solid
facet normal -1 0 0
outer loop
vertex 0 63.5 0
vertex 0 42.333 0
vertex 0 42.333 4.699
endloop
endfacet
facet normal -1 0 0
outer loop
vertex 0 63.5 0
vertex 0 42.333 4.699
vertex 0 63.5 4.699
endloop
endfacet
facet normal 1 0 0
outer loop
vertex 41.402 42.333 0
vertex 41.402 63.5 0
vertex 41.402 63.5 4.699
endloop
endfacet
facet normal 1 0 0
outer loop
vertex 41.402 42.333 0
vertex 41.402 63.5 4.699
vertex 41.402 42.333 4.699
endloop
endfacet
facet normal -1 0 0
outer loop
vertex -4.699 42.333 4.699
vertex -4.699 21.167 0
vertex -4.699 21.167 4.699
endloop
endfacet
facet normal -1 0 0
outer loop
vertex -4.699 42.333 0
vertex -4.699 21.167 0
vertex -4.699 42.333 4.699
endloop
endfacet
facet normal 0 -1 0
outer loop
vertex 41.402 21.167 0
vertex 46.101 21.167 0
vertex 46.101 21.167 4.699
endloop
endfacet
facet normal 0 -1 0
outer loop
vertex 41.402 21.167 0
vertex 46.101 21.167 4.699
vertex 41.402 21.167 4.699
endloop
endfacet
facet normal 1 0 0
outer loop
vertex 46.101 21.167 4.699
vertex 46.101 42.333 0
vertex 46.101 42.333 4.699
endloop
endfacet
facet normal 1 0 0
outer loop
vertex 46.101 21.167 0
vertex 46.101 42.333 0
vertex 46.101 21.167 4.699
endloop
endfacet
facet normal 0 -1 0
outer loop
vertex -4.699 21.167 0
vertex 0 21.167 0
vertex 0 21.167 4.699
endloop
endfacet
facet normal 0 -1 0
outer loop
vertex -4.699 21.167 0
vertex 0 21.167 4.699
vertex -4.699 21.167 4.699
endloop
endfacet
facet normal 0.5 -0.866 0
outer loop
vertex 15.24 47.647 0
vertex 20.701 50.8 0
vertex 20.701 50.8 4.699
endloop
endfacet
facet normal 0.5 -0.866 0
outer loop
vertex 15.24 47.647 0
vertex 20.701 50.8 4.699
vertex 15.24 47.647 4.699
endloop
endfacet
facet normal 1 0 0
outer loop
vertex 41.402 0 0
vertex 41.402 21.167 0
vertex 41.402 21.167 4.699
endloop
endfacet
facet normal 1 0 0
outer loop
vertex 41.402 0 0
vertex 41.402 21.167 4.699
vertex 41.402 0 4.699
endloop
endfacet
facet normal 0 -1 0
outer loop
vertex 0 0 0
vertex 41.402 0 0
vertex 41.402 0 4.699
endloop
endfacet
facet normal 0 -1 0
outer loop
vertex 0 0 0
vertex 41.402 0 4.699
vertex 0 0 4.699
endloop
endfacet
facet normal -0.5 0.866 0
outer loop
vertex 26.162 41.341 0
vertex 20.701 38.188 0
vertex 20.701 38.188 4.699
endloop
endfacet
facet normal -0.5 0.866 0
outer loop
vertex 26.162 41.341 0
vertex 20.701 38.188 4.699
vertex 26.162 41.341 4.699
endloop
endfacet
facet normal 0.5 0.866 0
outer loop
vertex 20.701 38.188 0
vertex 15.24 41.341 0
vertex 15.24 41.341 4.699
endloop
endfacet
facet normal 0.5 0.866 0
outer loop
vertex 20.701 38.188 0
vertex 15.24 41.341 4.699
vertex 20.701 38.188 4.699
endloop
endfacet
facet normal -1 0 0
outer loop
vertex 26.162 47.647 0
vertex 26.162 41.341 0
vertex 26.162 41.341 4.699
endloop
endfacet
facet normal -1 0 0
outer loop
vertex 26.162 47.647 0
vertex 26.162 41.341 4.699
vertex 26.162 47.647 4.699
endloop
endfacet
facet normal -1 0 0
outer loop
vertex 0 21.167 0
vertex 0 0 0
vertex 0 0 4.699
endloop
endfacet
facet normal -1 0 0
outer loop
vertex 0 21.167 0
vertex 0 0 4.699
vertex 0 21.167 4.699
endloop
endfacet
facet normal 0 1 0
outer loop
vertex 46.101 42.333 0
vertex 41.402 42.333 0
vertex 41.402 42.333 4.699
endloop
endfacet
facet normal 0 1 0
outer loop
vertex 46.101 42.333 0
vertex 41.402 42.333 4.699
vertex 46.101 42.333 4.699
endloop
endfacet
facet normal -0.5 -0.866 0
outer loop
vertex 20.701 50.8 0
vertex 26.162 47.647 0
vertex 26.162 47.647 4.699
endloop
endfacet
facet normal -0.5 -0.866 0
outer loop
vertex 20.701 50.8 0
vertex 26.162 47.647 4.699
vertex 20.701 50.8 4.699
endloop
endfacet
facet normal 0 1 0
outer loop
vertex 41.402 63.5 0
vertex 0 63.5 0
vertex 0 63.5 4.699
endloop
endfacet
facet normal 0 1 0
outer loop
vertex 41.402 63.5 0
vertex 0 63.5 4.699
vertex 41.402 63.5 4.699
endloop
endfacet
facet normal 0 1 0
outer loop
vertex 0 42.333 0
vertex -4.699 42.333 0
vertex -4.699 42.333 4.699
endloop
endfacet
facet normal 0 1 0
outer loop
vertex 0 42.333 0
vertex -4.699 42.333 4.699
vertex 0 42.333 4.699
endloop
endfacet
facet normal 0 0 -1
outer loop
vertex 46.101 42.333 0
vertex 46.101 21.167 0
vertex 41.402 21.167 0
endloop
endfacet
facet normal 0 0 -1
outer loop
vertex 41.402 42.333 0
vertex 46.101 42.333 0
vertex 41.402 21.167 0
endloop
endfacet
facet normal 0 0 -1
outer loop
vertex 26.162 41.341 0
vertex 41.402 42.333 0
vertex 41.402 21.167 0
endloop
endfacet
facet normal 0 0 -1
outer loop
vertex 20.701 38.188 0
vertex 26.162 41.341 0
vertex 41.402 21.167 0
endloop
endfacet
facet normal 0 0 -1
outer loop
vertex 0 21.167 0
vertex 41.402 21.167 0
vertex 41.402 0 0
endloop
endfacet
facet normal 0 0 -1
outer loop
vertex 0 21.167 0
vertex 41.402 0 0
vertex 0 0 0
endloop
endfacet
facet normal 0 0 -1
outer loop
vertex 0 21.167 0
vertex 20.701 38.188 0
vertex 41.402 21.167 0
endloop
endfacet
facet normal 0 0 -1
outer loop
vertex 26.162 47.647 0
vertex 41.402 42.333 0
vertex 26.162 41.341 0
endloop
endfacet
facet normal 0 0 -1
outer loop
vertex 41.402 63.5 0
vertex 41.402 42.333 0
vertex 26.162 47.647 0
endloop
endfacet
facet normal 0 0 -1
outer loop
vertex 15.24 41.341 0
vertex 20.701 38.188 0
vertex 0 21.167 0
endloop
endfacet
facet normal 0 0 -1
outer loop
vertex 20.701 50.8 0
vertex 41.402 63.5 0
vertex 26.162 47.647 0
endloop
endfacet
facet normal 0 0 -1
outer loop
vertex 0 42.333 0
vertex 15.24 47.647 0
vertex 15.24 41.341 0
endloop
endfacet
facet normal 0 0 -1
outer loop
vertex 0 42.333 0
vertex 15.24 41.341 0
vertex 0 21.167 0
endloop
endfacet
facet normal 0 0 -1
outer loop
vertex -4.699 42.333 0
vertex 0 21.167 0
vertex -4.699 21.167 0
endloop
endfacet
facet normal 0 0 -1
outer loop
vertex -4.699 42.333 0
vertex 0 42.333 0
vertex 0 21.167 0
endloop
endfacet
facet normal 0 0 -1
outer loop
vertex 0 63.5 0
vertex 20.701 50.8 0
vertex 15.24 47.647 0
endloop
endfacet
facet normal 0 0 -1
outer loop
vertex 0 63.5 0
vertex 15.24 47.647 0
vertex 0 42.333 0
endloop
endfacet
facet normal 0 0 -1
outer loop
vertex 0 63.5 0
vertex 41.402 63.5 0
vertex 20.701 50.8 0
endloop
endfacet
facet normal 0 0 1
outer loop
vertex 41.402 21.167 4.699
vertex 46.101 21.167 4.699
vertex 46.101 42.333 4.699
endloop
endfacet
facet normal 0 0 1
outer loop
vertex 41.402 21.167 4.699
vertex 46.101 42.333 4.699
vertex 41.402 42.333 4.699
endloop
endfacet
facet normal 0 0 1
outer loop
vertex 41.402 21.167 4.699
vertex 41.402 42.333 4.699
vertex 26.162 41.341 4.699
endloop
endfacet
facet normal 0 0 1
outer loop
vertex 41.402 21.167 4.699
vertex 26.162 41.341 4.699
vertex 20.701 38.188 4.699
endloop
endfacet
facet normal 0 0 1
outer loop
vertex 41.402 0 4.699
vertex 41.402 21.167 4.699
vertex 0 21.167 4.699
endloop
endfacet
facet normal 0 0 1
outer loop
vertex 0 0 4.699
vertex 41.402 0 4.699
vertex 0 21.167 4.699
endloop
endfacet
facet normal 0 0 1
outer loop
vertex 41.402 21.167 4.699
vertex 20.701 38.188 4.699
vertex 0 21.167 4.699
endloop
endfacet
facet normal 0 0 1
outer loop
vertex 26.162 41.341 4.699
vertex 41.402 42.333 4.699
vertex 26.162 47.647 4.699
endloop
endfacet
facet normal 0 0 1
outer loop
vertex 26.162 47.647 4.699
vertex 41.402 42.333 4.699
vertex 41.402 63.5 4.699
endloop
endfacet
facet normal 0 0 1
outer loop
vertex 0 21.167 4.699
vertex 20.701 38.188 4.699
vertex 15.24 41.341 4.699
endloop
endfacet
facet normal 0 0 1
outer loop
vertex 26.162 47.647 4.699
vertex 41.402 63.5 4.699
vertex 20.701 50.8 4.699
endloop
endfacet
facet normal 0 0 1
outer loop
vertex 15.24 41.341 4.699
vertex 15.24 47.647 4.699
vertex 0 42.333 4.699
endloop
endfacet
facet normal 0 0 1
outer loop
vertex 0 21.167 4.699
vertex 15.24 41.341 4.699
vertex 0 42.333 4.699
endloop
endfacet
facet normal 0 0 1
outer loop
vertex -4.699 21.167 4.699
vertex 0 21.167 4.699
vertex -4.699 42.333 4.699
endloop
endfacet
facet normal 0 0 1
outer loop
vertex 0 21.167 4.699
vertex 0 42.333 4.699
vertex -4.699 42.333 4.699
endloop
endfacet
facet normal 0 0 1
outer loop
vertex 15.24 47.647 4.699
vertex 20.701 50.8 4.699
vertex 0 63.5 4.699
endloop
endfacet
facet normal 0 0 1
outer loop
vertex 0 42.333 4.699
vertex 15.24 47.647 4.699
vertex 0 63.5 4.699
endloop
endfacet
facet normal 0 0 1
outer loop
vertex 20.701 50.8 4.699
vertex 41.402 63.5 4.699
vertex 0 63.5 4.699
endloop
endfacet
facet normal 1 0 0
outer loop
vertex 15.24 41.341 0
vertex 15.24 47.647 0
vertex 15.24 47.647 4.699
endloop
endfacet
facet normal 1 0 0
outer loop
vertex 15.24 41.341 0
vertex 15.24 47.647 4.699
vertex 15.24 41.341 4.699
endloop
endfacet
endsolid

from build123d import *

# Parameters (mm, degrees)
BOSS_EXTRUDE1_DEPTH = 4.699
SKETCH2_R           = 3.175
CUT_EXTRUDE1_DEPTH  = 79.610640514
CAVITY1_OUTLINE_R   = 3.175
CAVITY1_DEPTH       = 4.699


# Read off the part's stored shape, not the designer's step: Cavity1
with BuildPart() as part:
    # Sketch1 → Boss-Extrude1 (new body)
    with BuildSketch(Plane.XY):
        Polygon((0, 42.333333333), (0, 63.5), (41.402, 63.5), (41.402, 42.333333333), (46.101, 42.333333333), (46.101, 21.166666667), (41.402, 21.166666667), (41.402, 0), (0, 0), (0, 21.166666667), (-4.699, 21.166666667), (-4.699, 42.333333333), align=None)
    extrude(amount=BOSS_EXTRUDE1_DEPTH)

    # Sketch2 → Cut-Extrude1 (cut, through all)
    with BuildSketch(Plane(origin=(0, 0, 0), x_dir=(-1, 0, 0), z_dir=(0, 0, -1))):
        with Locations((-20.701, 44.45)):
            Circle(SKETCH2_R)
    extrude(amount=-CUT_EXTRUDE1_DEPTH, mode=Mode.SUBTRACT)

    # Cavity1 outline → Cavity1 (cut)
    with BuildSketch(Plane.XY):
        Polygon((15.24, 41.34127054), (20.701, 38.18836072), (26.162, 41.34127054), (26.162, 47.64709018), (20.701, 50.8), (15.24, 47.64709018), align=None)
        with Locations((20.701, 44.45)):
            Circle(CAVITY1_OUTLINE_R, mode=Mode.SUBTRACT)
    extrude(amount=CAVITY1_DEPTH, mode=Mode.SUBTRACT)


solid = part.part
